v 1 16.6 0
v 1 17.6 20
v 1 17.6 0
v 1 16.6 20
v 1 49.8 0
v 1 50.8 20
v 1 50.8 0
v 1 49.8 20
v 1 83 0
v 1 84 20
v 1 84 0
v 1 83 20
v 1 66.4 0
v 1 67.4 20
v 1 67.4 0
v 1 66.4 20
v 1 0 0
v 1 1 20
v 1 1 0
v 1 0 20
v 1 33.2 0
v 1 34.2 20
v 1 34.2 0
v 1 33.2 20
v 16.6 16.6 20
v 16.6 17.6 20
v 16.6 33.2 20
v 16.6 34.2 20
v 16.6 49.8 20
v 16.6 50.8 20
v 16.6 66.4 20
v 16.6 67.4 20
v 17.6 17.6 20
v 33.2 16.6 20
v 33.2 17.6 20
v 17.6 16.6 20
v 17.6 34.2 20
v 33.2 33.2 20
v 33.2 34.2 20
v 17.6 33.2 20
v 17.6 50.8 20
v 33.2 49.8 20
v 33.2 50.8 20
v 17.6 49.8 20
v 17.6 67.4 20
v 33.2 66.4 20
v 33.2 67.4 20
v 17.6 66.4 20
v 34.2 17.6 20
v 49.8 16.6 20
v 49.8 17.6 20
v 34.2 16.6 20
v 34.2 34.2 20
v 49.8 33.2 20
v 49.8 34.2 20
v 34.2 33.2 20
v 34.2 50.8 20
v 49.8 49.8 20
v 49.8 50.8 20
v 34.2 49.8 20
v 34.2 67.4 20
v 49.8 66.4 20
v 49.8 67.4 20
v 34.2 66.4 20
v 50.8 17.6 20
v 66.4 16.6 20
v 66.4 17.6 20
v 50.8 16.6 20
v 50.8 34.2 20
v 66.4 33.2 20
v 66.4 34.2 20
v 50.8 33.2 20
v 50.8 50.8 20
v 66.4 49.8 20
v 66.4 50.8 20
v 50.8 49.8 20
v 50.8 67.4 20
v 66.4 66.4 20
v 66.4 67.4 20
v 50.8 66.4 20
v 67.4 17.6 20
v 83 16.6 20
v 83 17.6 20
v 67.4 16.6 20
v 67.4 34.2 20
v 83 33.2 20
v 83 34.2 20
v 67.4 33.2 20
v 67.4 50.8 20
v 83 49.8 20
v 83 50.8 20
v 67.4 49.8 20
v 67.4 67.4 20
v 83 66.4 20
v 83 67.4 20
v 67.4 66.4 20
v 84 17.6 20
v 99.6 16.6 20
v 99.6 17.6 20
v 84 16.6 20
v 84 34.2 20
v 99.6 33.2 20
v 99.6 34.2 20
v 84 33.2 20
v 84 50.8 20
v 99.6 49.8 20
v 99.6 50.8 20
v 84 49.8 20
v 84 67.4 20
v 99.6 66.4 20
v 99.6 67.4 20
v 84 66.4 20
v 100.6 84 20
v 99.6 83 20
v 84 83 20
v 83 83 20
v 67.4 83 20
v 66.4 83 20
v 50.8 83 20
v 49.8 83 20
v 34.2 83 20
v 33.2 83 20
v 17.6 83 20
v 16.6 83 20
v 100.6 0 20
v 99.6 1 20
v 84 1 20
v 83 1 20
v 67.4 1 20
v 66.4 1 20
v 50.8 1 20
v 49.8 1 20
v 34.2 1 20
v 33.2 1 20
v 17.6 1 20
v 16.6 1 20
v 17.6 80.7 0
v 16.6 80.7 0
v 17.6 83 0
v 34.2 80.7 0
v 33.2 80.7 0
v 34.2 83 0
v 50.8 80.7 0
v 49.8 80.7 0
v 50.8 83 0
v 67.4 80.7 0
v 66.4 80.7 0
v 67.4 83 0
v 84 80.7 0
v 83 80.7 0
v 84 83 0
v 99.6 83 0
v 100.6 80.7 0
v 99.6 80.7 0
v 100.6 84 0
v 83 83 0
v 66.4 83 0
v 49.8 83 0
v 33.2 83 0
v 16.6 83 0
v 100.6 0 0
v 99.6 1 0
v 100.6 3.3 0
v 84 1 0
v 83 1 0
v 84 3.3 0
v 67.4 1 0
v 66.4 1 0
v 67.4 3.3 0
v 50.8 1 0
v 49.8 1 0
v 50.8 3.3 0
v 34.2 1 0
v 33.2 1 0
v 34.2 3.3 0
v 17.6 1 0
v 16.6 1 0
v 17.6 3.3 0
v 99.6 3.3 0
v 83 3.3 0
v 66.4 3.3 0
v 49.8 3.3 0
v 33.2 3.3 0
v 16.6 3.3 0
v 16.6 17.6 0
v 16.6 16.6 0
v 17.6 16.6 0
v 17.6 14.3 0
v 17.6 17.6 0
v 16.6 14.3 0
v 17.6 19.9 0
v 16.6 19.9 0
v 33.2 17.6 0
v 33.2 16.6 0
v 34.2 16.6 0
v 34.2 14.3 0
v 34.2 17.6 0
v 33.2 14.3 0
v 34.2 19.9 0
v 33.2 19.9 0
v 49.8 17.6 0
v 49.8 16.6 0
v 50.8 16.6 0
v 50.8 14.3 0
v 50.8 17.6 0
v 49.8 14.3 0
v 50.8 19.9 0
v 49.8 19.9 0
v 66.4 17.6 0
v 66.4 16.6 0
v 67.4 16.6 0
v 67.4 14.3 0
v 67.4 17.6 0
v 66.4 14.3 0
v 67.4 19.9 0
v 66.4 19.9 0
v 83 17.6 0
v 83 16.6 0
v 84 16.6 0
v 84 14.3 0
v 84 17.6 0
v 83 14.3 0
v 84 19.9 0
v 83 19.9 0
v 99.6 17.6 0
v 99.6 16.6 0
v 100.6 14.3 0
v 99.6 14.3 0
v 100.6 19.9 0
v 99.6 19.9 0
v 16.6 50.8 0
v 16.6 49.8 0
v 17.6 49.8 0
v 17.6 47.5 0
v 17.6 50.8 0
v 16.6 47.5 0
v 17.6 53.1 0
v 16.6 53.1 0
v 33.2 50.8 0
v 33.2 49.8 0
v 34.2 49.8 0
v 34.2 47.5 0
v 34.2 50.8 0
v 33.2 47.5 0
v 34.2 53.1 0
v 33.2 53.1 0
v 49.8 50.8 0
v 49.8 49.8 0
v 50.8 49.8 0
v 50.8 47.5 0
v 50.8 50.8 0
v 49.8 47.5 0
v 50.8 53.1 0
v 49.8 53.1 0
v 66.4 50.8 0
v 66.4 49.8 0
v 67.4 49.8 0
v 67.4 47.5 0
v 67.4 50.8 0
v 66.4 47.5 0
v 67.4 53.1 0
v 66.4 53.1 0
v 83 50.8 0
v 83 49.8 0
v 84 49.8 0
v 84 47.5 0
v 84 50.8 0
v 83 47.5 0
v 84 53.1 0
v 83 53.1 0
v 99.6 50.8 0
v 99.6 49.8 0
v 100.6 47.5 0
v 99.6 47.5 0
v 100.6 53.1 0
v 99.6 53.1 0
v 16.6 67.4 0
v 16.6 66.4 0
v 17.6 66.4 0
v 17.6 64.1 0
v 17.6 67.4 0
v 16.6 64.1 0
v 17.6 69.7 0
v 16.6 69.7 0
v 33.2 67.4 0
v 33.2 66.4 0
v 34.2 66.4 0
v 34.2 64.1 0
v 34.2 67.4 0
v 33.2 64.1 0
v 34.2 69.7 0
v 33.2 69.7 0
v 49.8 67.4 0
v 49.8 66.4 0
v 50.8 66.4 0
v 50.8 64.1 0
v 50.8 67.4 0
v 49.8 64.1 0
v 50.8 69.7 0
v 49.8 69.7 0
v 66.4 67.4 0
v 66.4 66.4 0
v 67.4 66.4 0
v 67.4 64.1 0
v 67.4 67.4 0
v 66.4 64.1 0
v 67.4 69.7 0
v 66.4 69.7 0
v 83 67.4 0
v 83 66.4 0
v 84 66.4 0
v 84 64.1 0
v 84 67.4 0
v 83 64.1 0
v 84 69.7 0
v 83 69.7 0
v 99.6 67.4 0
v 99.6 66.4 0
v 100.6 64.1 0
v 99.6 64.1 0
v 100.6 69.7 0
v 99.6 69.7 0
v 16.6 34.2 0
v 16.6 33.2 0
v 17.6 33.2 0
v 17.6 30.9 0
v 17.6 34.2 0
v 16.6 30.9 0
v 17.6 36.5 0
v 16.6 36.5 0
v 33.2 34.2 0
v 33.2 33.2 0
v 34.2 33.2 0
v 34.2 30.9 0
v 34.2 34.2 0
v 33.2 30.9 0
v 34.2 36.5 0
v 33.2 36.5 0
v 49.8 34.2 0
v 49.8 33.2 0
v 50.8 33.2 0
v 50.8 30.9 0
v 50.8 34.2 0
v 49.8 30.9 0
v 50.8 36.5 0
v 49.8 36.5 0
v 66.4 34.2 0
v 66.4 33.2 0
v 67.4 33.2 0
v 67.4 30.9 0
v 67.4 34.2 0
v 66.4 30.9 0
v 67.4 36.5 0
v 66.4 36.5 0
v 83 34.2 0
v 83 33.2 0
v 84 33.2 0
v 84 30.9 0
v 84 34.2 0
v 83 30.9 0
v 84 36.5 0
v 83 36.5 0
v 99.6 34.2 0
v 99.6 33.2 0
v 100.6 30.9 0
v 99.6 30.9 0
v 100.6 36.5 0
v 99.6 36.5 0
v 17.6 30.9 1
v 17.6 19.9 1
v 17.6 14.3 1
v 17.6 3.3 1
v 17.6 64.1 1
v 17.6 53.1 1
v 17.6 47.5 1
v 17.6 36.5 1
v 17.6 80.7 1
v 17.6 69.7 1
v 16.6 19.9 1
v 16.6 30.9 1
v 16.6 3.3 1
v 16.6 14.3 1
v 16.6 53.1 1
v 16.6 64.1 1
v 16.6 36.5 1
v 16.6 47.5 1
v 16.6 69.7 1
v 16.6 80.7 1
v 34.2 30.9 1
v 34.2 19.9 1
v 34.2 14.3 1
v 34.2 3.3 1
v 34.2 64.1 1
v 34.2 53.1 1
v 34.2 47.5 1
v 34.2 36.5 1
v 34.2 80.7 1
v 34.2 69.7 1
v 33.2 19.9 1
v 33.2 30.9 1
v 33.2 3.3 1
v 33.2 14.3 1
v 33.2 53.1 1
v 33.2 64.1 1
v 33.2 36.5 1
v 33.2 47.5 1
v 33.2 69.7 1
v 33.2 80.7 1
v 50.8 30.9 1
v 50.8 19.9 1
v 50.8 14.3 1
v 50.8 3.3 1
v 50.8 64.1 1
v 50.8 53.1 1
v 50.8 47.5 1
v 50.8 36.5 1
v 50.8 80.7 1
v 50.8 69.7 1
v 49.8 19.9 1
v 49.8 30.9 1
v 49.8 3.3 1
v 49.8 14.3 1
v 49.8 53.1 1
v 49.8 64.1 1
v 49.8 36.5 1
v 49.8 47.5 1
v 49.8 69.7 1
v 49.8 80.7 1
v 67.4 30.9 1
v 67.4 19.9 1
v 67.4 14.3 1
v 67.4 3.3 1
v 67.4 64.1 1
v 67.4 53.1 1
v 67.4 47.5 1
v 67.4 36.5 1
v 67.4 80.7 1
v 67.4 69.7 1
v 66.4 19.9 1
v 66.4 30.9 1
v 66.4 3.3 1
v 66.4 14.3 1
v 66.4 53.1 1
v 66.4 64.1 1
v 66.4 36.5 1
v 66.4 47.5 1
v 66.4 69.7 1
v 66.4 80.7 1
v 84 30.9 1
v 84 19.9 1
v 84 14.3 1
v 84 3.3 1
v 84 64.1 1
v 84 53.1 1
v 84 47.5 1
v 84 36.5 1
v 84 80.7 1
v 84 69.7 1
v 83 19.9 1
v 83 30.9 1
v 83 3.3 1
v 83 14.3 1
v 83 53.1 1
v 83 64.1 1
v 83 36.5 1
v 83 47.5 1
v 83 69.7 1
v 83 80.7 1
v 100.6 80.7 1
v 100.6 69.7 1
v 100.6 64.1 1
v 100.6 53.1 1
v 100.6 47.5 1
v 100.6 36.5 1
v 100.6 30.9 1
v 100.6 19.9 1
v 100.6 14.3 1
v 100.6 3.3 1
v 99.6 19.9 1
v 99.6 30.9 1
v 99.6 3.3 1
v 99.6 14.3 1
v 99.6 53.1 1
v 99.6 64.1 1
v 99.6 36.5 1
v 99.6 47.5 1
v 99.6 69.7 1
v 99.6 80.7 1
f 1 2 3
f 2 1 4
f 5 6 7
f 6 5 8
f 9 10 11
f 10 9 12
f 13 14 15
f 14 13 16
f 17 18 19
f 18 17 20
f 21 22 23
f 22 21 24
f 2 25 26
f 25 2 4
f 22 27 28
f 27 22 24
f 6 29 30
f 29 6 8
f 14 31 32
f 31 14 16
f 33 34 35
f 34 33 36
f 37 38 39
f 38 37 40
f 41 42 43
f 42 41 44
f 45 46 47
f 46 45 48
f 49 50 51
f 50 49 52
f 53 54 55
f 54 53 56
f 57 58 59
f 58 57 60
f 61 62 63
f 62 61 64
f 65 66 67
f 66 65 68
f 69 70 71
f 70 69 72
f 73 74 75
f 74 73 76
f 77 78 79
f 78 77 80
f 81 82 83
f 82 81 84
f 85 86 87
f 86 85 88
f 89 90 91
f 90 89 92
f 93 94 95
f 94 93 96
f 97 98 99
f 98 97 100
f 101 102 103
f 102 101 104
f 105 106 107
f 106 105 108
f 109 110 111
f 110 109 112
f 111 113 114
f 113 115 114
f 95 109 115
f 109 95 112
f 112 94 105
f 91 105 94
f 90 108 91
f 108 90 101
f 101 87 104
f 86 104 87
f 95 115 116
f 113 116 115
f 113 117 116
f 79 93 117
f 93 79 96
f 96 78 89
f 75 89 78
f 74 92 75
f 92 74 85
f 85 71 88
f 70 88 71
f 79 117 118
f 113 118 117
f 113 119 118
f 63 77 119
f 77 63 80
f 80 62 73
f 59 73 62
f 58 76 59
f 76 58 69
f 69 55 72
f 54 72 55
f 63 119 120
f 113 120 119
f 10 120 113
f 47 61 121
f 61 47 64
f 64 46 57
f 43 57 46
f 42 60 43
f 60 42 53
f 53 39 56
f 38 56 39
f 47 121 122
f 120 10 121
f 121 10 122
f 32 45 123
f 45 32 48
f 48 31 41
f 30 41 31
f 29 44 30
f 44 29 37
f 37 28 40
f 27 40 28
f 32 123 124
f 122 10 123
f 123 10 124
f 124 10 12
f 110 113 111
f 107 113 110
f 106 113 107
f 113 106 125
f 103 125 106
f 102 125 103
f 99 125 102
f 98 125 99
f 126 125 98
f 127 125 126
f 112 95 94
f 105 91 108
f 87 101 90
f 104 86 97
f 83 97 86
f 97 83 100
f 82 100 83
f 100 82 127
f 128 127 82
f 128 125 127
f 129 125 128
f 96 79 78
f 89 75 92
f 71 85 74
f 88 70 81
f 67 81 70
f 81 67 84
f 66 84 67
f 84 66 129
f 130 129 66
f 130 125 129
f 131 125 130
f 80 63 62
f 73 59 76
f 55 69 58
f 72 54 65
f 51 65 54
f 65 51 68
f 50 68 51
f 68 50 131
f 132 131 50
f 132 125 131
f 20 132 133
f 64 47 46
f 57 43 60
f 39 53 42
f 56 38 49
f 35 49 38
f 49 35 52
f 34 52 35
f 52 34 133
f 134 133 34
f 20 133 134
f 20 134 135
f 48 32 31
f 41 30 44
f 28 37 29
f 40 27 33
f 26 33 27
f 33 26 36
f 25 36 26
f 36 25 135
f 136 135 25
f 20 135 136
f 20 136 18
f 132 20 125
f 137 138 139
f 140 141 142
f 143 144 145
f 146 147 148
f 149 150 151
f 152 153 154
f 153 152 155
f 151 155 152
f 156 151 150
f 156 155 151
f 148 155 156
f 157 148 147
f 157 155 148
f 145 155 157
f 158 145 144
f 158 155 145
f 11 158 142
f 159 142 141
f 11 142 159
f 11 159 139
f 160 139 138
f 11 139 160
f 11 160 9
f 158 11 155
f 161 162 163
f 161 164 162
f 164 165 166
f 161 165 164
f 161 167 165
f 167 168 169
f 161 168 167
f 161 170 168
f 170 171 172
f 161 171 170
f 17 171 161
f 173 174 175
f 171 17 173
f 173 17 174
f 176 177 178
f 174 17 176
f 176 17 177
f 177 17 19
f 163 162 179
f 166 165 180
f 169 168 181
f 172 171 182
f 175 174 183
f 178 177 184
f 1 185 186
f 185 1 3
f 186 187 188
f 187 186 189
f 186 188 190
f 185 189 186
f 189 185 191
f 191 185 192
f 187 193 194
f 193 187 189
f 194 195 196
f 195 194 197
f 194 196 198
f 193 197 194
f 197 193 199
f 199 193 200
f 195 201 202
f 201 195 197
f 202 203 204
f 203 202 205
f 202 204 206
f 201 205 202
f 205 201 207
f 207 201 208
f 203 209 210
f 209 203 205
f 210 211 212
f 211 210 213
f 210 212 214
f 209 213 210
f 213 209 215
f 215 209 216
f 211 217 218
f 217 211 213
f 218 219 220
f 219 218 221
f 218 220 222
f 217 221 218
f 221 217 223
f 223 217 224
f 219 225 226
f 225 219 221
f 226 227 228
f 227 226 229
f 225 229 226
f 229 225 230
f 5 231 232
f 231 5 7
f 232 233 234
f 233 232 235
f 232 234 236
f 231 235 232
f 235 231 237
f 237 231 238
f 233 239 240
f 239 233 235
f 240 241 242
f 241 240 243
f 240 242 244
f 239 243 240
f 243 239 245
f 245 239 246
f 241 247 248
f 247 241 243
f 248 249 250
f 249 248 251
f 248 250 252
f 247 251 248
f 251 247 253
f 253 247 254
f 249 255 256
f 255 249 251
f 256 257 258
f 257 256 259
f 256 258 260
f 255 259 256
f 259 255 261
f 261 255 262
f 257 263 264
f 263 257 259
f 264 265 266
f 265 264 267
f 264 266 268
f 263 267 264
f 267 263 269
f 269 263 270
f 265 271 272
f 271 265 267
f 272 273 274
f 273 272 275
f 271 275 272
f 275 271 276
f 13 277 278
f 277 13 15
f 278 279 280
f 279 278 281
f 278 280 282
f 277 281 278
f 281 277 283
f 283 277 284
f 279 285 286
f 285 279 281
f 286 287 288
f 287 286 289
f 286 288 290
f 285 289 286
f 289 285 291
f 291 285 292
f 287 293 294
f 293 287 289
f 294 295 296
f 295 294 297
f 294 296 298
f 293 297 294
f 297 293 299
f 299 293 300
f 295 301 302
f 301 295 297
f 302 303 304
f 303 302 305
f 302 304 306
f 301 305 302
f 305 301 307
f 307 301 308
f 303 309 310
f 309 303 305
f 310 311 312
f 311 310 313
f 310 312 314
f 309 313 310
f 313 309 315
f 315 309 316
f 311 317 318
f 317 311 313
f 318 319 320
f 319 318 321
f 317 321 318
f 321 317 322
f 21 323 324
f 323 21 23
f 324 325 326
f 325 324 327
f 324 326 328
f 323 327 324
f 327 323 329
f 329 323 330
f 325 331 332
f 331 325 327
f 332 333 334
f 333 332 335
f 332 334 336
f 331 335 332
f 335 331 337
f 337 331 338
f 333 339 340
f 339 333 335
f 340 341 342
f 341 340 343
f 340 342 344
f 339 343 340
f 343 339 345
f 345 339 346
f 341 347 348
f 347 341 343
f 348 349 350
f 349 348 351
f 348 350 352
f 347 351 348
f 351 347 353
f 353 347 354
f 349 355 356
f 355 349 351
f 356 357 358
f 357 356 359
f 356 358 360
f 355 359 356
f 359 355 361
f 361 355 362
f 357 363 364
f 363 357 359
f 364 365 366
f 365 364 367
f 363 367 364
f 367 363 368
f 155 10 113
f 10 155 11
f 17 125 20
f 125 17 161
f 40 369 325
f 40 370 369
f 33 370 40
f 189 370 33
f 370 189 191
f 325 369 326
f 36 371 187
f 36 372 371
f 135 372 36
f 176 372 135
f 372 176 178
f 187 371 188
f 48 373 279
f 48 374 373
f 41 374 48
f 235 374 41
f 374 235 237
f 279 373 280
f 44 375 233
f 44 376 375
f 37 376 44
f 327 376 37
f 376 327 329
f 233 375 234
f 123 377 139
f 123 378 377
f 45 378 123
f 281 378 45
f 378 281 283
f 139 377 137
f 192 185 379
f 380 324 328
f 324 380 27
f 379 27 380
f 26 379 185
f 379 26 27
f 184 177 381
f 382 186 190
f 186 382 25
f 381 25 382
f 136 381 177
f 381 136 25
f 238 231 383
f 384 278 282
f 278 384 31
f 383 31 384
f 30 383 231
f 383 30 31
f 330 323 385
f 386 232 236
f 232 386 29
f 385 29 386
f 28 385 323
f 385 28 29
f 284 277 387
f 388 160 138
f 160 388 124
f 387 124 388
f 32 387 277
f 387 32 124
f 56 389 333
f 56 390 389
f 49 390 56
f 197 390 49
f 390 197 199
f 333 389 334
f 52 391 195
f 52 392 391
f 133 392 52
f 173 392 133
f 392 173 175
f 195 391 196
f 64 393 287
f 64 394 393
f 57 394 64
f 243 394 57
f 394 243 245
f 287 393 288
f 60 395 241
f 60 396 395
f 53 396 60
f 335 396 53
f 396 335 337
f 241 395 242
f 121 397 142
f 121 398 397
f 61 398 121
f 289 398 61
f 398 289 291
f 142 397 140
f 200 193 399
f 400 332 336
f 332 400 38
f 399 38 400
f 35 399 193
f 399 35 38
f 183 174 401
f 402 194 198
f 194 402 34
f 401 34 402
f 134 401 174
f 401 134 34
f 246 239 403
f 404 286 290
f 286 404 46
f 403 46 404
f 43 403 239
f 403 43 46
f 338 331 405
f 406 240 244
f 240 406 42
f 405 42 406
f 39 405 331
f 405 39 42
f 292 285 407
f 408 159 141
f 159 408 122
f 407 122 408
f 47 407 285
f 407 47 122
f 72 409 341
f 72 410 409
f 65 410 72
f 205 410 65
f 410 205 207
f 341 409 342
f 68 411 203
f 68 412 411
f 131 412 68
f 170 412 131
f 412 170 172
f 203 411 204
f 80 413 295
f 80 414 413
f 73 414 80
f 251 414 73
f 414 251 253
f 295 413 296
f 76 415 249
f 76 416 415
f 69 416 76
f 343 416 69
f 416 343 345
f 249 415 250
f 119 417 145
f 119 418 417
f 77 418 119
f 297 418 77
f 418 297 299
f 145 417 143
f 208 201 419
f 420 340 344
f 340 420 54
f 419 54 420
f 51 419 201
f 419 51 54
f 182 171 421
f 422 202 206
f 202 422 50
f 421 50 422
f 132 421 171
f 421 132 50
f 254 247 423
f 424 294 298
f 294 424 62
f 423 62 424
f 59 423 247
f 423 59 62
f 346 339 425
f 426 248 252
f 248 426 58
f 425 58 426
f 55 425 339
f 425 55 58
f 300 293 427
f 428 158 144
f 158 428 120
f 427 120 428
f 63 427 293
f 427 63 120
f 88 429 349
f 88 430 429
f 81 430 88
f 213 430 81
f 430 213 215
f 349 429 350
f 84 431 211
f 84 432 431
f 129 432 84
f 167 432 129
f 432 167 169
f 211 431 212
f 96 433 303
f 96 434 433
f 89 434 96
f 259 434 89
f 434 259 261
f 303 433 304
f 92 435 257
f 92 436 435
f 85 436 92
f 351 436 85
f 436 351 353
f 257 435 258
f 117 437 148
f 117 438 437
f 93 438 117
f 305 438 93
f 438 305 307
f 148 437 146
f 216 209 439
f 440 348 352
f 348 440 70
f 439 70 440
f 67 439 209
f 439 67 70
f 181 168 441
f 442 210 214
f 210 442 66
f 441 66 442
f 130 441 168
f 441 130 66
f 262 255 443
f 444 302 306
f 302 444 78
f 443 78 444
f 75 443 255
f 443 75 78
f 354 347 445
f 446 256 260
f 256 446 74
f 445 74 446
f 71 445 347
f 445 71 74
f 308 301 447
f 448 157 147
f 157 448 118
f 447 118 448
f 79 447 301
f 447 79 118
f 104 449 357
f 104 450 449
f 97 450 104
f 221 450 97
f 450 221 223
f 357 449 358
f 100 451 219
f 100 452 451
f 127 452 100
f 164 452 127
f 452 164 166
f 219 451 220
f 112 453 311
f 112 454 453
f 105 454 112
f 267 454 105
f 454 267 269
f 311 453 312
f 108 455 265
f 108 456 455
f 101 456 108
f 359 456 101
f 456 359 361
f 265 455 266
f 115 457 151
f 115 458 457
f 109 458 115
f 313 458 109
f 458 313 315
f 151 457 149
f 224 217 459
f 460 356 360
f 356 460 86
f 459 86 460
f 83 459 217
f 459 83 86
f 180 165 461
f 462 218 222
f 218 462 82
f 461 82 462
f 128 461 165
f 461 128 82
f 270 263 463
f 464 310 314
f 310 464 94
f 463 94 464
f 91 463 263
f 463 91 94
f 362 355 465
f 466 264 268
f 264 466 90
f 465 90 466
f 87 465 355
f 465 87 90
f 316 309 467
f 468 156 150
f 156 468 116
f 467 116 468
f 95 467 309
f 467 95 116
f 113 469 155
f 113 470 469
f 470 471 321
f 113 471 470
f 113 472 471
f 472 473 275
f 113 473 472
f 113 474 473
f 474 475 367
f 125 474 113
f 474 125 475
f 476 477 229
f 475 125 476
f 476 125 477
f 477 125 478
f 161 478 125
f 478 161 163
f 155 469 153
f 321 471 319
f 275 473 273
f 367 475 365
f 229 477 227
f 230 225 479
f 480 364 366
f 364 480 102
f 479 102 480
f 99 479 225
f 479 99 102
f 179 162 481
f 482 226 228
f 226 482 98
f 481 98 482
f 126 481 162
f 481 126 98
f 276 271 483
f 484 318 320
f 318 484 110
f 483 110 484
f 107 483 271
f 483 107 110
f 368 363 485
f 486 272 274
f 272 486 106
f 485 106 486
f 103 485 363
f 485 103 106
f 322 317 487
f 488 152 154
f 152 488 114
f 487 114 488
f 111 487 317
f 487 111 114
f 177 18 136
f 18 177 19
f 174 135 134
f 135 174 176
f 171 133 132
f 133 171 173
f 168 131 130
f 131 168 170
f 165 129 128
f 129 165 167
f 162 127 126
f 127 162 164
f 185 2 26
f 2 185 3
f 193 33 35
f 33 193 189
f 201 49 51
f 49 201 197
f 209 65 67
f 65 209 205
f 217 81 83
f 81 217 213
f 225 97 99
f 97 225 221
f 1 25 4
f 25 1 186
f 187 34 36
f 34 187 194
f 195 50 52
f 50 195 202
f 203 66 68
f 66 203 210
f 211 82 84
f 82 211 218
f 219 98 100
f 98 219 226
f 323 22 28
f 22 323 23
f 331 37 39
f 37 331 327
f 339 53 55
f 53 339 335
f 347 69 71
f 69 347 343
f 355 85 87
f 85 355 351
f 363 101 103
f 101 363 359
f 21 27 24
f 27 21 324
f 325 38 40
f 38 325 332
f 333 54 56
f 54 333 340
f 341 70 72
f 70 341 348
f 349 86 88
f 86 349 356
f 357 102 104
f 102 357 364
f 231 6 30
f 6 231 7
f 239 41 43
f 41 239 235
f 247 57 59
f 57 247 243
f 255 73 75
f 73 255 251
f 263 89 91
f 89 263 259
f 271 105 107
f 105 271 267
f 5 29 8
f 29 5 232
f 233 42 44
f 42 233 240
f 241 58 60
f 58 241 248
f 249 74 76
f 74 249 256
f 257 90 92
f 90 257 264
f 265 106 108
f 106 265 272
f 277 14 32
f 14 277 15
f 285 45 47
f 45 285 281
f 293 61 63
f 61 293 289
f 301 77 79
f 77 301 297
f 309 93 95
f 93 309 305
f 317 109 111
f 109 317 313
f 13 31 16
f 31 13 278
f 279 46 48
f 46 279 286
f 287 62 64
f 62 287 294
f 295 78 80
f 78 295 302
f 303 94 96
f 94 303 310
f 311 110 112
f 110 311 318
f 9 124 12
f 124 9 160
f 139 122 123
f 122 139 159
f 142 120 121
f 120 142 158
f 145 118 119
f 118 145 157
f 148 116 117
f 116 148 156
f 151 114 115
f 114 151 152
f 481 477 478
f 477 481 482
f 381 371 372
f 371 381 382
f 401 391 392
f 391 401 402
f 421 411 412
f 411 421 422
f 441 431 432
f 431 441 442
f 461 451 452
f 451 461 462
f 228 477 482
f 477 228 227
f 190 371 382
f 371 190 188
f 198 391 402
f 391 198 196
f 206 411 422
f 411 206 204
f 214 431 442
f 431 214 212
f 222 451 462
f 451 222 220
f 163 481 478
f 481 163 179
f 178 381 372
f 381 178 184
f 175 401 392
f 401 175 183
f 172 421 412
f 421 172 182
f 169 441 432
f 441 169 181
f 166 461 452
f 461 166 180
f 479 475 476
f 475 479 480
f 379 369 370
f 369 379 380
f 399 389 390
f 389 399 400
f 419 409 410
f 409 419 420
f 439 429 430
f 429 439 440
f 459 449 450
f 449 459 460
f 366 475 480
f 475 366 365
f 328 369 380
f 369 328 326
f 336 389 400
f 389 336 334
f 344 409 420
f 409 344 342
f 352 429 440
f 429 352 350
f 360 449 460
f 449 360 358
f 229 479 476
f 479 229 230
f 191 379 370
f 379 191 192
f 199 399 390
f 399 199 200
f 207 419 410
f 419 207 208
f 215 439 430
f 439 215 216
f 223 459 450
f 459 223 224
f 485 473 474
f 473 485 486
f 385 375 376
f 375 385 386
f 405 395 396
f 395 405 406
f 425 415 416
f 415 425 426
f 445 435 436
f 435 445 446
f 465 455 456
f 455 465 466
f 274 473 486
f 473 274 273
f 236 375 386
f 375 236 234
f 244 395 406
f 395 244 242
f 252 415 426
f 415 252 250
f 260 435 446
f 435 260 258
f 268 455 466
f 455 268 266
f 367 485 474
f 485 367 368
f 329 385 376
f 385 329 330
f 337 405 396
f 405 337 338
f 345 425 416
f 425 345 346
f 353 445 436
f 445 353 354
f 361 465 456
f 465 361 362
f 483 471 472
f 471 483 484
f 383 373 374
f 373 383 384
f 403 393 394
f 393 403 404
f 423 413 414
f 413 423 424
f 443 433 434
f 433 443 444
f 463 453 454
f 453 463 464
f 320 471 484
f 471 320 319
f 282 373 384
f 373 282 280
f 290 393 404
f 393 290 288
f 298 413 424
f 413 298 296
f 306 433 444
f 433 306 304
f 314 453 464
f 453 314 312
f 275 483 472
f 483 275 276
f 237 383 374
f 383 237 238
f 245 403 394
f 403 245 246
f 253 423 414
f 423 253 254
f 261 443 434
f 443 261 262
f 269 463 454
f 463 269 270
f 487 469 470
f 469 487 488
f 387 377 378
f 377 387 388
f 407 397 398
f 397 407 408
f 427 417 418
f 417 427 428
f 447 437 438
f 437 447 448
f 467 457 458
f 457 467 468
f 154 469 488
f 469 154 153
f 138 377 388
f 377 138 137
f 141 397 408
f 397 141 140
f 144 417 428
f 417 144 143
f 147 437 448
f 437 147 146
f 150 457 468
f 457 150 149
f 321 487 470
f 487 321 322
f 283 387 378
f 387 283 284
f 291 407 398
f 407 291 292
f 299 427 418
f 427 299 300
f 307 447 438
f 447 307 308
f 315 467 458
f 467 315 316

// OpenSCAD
pixel_width = 16.6;
pixel_wall = 1;
pixel_height = 20;
strip_width = 11;
strip_height = 1;

pixels_x = 6;
pixels_y = 5;

remove_wall_x = 1;
remove_wall_y = 0;

difference() {
	union() {
		for (x = [0 : pixels_x]) {
			translate([x * pixel_width, 0, 0])
				cube([pixel_wall, pixels_y * pixel_width + pixel_wall, pixel_height]);
		}
		for (y = [0 : pixels_y]) {
			translate([0, y * pixel_width, 0])
				cube([pixels_x * pixel_width + pixel_wall, pixel_wall, pixel_height]);
		}
	}
	for (y = [0 : pixels_y-1]) {
		translate([0, (pixel_width + pixel_wall - strip_width)/2 + y * pixel_width, 0])
			cube([pixels_x * pixel_width + pixel_wall, strip_width, strip_height]);
	}
	if (remove_wall_x)
		cube([pixel_wall, pixels_y * pixel_width + pixel_wall, pixel_height]);
	if (remove_wall_y)
		cube([pixels_x * pixel_width + pixel_wall, pixel_wall, pixel_height]);
}
